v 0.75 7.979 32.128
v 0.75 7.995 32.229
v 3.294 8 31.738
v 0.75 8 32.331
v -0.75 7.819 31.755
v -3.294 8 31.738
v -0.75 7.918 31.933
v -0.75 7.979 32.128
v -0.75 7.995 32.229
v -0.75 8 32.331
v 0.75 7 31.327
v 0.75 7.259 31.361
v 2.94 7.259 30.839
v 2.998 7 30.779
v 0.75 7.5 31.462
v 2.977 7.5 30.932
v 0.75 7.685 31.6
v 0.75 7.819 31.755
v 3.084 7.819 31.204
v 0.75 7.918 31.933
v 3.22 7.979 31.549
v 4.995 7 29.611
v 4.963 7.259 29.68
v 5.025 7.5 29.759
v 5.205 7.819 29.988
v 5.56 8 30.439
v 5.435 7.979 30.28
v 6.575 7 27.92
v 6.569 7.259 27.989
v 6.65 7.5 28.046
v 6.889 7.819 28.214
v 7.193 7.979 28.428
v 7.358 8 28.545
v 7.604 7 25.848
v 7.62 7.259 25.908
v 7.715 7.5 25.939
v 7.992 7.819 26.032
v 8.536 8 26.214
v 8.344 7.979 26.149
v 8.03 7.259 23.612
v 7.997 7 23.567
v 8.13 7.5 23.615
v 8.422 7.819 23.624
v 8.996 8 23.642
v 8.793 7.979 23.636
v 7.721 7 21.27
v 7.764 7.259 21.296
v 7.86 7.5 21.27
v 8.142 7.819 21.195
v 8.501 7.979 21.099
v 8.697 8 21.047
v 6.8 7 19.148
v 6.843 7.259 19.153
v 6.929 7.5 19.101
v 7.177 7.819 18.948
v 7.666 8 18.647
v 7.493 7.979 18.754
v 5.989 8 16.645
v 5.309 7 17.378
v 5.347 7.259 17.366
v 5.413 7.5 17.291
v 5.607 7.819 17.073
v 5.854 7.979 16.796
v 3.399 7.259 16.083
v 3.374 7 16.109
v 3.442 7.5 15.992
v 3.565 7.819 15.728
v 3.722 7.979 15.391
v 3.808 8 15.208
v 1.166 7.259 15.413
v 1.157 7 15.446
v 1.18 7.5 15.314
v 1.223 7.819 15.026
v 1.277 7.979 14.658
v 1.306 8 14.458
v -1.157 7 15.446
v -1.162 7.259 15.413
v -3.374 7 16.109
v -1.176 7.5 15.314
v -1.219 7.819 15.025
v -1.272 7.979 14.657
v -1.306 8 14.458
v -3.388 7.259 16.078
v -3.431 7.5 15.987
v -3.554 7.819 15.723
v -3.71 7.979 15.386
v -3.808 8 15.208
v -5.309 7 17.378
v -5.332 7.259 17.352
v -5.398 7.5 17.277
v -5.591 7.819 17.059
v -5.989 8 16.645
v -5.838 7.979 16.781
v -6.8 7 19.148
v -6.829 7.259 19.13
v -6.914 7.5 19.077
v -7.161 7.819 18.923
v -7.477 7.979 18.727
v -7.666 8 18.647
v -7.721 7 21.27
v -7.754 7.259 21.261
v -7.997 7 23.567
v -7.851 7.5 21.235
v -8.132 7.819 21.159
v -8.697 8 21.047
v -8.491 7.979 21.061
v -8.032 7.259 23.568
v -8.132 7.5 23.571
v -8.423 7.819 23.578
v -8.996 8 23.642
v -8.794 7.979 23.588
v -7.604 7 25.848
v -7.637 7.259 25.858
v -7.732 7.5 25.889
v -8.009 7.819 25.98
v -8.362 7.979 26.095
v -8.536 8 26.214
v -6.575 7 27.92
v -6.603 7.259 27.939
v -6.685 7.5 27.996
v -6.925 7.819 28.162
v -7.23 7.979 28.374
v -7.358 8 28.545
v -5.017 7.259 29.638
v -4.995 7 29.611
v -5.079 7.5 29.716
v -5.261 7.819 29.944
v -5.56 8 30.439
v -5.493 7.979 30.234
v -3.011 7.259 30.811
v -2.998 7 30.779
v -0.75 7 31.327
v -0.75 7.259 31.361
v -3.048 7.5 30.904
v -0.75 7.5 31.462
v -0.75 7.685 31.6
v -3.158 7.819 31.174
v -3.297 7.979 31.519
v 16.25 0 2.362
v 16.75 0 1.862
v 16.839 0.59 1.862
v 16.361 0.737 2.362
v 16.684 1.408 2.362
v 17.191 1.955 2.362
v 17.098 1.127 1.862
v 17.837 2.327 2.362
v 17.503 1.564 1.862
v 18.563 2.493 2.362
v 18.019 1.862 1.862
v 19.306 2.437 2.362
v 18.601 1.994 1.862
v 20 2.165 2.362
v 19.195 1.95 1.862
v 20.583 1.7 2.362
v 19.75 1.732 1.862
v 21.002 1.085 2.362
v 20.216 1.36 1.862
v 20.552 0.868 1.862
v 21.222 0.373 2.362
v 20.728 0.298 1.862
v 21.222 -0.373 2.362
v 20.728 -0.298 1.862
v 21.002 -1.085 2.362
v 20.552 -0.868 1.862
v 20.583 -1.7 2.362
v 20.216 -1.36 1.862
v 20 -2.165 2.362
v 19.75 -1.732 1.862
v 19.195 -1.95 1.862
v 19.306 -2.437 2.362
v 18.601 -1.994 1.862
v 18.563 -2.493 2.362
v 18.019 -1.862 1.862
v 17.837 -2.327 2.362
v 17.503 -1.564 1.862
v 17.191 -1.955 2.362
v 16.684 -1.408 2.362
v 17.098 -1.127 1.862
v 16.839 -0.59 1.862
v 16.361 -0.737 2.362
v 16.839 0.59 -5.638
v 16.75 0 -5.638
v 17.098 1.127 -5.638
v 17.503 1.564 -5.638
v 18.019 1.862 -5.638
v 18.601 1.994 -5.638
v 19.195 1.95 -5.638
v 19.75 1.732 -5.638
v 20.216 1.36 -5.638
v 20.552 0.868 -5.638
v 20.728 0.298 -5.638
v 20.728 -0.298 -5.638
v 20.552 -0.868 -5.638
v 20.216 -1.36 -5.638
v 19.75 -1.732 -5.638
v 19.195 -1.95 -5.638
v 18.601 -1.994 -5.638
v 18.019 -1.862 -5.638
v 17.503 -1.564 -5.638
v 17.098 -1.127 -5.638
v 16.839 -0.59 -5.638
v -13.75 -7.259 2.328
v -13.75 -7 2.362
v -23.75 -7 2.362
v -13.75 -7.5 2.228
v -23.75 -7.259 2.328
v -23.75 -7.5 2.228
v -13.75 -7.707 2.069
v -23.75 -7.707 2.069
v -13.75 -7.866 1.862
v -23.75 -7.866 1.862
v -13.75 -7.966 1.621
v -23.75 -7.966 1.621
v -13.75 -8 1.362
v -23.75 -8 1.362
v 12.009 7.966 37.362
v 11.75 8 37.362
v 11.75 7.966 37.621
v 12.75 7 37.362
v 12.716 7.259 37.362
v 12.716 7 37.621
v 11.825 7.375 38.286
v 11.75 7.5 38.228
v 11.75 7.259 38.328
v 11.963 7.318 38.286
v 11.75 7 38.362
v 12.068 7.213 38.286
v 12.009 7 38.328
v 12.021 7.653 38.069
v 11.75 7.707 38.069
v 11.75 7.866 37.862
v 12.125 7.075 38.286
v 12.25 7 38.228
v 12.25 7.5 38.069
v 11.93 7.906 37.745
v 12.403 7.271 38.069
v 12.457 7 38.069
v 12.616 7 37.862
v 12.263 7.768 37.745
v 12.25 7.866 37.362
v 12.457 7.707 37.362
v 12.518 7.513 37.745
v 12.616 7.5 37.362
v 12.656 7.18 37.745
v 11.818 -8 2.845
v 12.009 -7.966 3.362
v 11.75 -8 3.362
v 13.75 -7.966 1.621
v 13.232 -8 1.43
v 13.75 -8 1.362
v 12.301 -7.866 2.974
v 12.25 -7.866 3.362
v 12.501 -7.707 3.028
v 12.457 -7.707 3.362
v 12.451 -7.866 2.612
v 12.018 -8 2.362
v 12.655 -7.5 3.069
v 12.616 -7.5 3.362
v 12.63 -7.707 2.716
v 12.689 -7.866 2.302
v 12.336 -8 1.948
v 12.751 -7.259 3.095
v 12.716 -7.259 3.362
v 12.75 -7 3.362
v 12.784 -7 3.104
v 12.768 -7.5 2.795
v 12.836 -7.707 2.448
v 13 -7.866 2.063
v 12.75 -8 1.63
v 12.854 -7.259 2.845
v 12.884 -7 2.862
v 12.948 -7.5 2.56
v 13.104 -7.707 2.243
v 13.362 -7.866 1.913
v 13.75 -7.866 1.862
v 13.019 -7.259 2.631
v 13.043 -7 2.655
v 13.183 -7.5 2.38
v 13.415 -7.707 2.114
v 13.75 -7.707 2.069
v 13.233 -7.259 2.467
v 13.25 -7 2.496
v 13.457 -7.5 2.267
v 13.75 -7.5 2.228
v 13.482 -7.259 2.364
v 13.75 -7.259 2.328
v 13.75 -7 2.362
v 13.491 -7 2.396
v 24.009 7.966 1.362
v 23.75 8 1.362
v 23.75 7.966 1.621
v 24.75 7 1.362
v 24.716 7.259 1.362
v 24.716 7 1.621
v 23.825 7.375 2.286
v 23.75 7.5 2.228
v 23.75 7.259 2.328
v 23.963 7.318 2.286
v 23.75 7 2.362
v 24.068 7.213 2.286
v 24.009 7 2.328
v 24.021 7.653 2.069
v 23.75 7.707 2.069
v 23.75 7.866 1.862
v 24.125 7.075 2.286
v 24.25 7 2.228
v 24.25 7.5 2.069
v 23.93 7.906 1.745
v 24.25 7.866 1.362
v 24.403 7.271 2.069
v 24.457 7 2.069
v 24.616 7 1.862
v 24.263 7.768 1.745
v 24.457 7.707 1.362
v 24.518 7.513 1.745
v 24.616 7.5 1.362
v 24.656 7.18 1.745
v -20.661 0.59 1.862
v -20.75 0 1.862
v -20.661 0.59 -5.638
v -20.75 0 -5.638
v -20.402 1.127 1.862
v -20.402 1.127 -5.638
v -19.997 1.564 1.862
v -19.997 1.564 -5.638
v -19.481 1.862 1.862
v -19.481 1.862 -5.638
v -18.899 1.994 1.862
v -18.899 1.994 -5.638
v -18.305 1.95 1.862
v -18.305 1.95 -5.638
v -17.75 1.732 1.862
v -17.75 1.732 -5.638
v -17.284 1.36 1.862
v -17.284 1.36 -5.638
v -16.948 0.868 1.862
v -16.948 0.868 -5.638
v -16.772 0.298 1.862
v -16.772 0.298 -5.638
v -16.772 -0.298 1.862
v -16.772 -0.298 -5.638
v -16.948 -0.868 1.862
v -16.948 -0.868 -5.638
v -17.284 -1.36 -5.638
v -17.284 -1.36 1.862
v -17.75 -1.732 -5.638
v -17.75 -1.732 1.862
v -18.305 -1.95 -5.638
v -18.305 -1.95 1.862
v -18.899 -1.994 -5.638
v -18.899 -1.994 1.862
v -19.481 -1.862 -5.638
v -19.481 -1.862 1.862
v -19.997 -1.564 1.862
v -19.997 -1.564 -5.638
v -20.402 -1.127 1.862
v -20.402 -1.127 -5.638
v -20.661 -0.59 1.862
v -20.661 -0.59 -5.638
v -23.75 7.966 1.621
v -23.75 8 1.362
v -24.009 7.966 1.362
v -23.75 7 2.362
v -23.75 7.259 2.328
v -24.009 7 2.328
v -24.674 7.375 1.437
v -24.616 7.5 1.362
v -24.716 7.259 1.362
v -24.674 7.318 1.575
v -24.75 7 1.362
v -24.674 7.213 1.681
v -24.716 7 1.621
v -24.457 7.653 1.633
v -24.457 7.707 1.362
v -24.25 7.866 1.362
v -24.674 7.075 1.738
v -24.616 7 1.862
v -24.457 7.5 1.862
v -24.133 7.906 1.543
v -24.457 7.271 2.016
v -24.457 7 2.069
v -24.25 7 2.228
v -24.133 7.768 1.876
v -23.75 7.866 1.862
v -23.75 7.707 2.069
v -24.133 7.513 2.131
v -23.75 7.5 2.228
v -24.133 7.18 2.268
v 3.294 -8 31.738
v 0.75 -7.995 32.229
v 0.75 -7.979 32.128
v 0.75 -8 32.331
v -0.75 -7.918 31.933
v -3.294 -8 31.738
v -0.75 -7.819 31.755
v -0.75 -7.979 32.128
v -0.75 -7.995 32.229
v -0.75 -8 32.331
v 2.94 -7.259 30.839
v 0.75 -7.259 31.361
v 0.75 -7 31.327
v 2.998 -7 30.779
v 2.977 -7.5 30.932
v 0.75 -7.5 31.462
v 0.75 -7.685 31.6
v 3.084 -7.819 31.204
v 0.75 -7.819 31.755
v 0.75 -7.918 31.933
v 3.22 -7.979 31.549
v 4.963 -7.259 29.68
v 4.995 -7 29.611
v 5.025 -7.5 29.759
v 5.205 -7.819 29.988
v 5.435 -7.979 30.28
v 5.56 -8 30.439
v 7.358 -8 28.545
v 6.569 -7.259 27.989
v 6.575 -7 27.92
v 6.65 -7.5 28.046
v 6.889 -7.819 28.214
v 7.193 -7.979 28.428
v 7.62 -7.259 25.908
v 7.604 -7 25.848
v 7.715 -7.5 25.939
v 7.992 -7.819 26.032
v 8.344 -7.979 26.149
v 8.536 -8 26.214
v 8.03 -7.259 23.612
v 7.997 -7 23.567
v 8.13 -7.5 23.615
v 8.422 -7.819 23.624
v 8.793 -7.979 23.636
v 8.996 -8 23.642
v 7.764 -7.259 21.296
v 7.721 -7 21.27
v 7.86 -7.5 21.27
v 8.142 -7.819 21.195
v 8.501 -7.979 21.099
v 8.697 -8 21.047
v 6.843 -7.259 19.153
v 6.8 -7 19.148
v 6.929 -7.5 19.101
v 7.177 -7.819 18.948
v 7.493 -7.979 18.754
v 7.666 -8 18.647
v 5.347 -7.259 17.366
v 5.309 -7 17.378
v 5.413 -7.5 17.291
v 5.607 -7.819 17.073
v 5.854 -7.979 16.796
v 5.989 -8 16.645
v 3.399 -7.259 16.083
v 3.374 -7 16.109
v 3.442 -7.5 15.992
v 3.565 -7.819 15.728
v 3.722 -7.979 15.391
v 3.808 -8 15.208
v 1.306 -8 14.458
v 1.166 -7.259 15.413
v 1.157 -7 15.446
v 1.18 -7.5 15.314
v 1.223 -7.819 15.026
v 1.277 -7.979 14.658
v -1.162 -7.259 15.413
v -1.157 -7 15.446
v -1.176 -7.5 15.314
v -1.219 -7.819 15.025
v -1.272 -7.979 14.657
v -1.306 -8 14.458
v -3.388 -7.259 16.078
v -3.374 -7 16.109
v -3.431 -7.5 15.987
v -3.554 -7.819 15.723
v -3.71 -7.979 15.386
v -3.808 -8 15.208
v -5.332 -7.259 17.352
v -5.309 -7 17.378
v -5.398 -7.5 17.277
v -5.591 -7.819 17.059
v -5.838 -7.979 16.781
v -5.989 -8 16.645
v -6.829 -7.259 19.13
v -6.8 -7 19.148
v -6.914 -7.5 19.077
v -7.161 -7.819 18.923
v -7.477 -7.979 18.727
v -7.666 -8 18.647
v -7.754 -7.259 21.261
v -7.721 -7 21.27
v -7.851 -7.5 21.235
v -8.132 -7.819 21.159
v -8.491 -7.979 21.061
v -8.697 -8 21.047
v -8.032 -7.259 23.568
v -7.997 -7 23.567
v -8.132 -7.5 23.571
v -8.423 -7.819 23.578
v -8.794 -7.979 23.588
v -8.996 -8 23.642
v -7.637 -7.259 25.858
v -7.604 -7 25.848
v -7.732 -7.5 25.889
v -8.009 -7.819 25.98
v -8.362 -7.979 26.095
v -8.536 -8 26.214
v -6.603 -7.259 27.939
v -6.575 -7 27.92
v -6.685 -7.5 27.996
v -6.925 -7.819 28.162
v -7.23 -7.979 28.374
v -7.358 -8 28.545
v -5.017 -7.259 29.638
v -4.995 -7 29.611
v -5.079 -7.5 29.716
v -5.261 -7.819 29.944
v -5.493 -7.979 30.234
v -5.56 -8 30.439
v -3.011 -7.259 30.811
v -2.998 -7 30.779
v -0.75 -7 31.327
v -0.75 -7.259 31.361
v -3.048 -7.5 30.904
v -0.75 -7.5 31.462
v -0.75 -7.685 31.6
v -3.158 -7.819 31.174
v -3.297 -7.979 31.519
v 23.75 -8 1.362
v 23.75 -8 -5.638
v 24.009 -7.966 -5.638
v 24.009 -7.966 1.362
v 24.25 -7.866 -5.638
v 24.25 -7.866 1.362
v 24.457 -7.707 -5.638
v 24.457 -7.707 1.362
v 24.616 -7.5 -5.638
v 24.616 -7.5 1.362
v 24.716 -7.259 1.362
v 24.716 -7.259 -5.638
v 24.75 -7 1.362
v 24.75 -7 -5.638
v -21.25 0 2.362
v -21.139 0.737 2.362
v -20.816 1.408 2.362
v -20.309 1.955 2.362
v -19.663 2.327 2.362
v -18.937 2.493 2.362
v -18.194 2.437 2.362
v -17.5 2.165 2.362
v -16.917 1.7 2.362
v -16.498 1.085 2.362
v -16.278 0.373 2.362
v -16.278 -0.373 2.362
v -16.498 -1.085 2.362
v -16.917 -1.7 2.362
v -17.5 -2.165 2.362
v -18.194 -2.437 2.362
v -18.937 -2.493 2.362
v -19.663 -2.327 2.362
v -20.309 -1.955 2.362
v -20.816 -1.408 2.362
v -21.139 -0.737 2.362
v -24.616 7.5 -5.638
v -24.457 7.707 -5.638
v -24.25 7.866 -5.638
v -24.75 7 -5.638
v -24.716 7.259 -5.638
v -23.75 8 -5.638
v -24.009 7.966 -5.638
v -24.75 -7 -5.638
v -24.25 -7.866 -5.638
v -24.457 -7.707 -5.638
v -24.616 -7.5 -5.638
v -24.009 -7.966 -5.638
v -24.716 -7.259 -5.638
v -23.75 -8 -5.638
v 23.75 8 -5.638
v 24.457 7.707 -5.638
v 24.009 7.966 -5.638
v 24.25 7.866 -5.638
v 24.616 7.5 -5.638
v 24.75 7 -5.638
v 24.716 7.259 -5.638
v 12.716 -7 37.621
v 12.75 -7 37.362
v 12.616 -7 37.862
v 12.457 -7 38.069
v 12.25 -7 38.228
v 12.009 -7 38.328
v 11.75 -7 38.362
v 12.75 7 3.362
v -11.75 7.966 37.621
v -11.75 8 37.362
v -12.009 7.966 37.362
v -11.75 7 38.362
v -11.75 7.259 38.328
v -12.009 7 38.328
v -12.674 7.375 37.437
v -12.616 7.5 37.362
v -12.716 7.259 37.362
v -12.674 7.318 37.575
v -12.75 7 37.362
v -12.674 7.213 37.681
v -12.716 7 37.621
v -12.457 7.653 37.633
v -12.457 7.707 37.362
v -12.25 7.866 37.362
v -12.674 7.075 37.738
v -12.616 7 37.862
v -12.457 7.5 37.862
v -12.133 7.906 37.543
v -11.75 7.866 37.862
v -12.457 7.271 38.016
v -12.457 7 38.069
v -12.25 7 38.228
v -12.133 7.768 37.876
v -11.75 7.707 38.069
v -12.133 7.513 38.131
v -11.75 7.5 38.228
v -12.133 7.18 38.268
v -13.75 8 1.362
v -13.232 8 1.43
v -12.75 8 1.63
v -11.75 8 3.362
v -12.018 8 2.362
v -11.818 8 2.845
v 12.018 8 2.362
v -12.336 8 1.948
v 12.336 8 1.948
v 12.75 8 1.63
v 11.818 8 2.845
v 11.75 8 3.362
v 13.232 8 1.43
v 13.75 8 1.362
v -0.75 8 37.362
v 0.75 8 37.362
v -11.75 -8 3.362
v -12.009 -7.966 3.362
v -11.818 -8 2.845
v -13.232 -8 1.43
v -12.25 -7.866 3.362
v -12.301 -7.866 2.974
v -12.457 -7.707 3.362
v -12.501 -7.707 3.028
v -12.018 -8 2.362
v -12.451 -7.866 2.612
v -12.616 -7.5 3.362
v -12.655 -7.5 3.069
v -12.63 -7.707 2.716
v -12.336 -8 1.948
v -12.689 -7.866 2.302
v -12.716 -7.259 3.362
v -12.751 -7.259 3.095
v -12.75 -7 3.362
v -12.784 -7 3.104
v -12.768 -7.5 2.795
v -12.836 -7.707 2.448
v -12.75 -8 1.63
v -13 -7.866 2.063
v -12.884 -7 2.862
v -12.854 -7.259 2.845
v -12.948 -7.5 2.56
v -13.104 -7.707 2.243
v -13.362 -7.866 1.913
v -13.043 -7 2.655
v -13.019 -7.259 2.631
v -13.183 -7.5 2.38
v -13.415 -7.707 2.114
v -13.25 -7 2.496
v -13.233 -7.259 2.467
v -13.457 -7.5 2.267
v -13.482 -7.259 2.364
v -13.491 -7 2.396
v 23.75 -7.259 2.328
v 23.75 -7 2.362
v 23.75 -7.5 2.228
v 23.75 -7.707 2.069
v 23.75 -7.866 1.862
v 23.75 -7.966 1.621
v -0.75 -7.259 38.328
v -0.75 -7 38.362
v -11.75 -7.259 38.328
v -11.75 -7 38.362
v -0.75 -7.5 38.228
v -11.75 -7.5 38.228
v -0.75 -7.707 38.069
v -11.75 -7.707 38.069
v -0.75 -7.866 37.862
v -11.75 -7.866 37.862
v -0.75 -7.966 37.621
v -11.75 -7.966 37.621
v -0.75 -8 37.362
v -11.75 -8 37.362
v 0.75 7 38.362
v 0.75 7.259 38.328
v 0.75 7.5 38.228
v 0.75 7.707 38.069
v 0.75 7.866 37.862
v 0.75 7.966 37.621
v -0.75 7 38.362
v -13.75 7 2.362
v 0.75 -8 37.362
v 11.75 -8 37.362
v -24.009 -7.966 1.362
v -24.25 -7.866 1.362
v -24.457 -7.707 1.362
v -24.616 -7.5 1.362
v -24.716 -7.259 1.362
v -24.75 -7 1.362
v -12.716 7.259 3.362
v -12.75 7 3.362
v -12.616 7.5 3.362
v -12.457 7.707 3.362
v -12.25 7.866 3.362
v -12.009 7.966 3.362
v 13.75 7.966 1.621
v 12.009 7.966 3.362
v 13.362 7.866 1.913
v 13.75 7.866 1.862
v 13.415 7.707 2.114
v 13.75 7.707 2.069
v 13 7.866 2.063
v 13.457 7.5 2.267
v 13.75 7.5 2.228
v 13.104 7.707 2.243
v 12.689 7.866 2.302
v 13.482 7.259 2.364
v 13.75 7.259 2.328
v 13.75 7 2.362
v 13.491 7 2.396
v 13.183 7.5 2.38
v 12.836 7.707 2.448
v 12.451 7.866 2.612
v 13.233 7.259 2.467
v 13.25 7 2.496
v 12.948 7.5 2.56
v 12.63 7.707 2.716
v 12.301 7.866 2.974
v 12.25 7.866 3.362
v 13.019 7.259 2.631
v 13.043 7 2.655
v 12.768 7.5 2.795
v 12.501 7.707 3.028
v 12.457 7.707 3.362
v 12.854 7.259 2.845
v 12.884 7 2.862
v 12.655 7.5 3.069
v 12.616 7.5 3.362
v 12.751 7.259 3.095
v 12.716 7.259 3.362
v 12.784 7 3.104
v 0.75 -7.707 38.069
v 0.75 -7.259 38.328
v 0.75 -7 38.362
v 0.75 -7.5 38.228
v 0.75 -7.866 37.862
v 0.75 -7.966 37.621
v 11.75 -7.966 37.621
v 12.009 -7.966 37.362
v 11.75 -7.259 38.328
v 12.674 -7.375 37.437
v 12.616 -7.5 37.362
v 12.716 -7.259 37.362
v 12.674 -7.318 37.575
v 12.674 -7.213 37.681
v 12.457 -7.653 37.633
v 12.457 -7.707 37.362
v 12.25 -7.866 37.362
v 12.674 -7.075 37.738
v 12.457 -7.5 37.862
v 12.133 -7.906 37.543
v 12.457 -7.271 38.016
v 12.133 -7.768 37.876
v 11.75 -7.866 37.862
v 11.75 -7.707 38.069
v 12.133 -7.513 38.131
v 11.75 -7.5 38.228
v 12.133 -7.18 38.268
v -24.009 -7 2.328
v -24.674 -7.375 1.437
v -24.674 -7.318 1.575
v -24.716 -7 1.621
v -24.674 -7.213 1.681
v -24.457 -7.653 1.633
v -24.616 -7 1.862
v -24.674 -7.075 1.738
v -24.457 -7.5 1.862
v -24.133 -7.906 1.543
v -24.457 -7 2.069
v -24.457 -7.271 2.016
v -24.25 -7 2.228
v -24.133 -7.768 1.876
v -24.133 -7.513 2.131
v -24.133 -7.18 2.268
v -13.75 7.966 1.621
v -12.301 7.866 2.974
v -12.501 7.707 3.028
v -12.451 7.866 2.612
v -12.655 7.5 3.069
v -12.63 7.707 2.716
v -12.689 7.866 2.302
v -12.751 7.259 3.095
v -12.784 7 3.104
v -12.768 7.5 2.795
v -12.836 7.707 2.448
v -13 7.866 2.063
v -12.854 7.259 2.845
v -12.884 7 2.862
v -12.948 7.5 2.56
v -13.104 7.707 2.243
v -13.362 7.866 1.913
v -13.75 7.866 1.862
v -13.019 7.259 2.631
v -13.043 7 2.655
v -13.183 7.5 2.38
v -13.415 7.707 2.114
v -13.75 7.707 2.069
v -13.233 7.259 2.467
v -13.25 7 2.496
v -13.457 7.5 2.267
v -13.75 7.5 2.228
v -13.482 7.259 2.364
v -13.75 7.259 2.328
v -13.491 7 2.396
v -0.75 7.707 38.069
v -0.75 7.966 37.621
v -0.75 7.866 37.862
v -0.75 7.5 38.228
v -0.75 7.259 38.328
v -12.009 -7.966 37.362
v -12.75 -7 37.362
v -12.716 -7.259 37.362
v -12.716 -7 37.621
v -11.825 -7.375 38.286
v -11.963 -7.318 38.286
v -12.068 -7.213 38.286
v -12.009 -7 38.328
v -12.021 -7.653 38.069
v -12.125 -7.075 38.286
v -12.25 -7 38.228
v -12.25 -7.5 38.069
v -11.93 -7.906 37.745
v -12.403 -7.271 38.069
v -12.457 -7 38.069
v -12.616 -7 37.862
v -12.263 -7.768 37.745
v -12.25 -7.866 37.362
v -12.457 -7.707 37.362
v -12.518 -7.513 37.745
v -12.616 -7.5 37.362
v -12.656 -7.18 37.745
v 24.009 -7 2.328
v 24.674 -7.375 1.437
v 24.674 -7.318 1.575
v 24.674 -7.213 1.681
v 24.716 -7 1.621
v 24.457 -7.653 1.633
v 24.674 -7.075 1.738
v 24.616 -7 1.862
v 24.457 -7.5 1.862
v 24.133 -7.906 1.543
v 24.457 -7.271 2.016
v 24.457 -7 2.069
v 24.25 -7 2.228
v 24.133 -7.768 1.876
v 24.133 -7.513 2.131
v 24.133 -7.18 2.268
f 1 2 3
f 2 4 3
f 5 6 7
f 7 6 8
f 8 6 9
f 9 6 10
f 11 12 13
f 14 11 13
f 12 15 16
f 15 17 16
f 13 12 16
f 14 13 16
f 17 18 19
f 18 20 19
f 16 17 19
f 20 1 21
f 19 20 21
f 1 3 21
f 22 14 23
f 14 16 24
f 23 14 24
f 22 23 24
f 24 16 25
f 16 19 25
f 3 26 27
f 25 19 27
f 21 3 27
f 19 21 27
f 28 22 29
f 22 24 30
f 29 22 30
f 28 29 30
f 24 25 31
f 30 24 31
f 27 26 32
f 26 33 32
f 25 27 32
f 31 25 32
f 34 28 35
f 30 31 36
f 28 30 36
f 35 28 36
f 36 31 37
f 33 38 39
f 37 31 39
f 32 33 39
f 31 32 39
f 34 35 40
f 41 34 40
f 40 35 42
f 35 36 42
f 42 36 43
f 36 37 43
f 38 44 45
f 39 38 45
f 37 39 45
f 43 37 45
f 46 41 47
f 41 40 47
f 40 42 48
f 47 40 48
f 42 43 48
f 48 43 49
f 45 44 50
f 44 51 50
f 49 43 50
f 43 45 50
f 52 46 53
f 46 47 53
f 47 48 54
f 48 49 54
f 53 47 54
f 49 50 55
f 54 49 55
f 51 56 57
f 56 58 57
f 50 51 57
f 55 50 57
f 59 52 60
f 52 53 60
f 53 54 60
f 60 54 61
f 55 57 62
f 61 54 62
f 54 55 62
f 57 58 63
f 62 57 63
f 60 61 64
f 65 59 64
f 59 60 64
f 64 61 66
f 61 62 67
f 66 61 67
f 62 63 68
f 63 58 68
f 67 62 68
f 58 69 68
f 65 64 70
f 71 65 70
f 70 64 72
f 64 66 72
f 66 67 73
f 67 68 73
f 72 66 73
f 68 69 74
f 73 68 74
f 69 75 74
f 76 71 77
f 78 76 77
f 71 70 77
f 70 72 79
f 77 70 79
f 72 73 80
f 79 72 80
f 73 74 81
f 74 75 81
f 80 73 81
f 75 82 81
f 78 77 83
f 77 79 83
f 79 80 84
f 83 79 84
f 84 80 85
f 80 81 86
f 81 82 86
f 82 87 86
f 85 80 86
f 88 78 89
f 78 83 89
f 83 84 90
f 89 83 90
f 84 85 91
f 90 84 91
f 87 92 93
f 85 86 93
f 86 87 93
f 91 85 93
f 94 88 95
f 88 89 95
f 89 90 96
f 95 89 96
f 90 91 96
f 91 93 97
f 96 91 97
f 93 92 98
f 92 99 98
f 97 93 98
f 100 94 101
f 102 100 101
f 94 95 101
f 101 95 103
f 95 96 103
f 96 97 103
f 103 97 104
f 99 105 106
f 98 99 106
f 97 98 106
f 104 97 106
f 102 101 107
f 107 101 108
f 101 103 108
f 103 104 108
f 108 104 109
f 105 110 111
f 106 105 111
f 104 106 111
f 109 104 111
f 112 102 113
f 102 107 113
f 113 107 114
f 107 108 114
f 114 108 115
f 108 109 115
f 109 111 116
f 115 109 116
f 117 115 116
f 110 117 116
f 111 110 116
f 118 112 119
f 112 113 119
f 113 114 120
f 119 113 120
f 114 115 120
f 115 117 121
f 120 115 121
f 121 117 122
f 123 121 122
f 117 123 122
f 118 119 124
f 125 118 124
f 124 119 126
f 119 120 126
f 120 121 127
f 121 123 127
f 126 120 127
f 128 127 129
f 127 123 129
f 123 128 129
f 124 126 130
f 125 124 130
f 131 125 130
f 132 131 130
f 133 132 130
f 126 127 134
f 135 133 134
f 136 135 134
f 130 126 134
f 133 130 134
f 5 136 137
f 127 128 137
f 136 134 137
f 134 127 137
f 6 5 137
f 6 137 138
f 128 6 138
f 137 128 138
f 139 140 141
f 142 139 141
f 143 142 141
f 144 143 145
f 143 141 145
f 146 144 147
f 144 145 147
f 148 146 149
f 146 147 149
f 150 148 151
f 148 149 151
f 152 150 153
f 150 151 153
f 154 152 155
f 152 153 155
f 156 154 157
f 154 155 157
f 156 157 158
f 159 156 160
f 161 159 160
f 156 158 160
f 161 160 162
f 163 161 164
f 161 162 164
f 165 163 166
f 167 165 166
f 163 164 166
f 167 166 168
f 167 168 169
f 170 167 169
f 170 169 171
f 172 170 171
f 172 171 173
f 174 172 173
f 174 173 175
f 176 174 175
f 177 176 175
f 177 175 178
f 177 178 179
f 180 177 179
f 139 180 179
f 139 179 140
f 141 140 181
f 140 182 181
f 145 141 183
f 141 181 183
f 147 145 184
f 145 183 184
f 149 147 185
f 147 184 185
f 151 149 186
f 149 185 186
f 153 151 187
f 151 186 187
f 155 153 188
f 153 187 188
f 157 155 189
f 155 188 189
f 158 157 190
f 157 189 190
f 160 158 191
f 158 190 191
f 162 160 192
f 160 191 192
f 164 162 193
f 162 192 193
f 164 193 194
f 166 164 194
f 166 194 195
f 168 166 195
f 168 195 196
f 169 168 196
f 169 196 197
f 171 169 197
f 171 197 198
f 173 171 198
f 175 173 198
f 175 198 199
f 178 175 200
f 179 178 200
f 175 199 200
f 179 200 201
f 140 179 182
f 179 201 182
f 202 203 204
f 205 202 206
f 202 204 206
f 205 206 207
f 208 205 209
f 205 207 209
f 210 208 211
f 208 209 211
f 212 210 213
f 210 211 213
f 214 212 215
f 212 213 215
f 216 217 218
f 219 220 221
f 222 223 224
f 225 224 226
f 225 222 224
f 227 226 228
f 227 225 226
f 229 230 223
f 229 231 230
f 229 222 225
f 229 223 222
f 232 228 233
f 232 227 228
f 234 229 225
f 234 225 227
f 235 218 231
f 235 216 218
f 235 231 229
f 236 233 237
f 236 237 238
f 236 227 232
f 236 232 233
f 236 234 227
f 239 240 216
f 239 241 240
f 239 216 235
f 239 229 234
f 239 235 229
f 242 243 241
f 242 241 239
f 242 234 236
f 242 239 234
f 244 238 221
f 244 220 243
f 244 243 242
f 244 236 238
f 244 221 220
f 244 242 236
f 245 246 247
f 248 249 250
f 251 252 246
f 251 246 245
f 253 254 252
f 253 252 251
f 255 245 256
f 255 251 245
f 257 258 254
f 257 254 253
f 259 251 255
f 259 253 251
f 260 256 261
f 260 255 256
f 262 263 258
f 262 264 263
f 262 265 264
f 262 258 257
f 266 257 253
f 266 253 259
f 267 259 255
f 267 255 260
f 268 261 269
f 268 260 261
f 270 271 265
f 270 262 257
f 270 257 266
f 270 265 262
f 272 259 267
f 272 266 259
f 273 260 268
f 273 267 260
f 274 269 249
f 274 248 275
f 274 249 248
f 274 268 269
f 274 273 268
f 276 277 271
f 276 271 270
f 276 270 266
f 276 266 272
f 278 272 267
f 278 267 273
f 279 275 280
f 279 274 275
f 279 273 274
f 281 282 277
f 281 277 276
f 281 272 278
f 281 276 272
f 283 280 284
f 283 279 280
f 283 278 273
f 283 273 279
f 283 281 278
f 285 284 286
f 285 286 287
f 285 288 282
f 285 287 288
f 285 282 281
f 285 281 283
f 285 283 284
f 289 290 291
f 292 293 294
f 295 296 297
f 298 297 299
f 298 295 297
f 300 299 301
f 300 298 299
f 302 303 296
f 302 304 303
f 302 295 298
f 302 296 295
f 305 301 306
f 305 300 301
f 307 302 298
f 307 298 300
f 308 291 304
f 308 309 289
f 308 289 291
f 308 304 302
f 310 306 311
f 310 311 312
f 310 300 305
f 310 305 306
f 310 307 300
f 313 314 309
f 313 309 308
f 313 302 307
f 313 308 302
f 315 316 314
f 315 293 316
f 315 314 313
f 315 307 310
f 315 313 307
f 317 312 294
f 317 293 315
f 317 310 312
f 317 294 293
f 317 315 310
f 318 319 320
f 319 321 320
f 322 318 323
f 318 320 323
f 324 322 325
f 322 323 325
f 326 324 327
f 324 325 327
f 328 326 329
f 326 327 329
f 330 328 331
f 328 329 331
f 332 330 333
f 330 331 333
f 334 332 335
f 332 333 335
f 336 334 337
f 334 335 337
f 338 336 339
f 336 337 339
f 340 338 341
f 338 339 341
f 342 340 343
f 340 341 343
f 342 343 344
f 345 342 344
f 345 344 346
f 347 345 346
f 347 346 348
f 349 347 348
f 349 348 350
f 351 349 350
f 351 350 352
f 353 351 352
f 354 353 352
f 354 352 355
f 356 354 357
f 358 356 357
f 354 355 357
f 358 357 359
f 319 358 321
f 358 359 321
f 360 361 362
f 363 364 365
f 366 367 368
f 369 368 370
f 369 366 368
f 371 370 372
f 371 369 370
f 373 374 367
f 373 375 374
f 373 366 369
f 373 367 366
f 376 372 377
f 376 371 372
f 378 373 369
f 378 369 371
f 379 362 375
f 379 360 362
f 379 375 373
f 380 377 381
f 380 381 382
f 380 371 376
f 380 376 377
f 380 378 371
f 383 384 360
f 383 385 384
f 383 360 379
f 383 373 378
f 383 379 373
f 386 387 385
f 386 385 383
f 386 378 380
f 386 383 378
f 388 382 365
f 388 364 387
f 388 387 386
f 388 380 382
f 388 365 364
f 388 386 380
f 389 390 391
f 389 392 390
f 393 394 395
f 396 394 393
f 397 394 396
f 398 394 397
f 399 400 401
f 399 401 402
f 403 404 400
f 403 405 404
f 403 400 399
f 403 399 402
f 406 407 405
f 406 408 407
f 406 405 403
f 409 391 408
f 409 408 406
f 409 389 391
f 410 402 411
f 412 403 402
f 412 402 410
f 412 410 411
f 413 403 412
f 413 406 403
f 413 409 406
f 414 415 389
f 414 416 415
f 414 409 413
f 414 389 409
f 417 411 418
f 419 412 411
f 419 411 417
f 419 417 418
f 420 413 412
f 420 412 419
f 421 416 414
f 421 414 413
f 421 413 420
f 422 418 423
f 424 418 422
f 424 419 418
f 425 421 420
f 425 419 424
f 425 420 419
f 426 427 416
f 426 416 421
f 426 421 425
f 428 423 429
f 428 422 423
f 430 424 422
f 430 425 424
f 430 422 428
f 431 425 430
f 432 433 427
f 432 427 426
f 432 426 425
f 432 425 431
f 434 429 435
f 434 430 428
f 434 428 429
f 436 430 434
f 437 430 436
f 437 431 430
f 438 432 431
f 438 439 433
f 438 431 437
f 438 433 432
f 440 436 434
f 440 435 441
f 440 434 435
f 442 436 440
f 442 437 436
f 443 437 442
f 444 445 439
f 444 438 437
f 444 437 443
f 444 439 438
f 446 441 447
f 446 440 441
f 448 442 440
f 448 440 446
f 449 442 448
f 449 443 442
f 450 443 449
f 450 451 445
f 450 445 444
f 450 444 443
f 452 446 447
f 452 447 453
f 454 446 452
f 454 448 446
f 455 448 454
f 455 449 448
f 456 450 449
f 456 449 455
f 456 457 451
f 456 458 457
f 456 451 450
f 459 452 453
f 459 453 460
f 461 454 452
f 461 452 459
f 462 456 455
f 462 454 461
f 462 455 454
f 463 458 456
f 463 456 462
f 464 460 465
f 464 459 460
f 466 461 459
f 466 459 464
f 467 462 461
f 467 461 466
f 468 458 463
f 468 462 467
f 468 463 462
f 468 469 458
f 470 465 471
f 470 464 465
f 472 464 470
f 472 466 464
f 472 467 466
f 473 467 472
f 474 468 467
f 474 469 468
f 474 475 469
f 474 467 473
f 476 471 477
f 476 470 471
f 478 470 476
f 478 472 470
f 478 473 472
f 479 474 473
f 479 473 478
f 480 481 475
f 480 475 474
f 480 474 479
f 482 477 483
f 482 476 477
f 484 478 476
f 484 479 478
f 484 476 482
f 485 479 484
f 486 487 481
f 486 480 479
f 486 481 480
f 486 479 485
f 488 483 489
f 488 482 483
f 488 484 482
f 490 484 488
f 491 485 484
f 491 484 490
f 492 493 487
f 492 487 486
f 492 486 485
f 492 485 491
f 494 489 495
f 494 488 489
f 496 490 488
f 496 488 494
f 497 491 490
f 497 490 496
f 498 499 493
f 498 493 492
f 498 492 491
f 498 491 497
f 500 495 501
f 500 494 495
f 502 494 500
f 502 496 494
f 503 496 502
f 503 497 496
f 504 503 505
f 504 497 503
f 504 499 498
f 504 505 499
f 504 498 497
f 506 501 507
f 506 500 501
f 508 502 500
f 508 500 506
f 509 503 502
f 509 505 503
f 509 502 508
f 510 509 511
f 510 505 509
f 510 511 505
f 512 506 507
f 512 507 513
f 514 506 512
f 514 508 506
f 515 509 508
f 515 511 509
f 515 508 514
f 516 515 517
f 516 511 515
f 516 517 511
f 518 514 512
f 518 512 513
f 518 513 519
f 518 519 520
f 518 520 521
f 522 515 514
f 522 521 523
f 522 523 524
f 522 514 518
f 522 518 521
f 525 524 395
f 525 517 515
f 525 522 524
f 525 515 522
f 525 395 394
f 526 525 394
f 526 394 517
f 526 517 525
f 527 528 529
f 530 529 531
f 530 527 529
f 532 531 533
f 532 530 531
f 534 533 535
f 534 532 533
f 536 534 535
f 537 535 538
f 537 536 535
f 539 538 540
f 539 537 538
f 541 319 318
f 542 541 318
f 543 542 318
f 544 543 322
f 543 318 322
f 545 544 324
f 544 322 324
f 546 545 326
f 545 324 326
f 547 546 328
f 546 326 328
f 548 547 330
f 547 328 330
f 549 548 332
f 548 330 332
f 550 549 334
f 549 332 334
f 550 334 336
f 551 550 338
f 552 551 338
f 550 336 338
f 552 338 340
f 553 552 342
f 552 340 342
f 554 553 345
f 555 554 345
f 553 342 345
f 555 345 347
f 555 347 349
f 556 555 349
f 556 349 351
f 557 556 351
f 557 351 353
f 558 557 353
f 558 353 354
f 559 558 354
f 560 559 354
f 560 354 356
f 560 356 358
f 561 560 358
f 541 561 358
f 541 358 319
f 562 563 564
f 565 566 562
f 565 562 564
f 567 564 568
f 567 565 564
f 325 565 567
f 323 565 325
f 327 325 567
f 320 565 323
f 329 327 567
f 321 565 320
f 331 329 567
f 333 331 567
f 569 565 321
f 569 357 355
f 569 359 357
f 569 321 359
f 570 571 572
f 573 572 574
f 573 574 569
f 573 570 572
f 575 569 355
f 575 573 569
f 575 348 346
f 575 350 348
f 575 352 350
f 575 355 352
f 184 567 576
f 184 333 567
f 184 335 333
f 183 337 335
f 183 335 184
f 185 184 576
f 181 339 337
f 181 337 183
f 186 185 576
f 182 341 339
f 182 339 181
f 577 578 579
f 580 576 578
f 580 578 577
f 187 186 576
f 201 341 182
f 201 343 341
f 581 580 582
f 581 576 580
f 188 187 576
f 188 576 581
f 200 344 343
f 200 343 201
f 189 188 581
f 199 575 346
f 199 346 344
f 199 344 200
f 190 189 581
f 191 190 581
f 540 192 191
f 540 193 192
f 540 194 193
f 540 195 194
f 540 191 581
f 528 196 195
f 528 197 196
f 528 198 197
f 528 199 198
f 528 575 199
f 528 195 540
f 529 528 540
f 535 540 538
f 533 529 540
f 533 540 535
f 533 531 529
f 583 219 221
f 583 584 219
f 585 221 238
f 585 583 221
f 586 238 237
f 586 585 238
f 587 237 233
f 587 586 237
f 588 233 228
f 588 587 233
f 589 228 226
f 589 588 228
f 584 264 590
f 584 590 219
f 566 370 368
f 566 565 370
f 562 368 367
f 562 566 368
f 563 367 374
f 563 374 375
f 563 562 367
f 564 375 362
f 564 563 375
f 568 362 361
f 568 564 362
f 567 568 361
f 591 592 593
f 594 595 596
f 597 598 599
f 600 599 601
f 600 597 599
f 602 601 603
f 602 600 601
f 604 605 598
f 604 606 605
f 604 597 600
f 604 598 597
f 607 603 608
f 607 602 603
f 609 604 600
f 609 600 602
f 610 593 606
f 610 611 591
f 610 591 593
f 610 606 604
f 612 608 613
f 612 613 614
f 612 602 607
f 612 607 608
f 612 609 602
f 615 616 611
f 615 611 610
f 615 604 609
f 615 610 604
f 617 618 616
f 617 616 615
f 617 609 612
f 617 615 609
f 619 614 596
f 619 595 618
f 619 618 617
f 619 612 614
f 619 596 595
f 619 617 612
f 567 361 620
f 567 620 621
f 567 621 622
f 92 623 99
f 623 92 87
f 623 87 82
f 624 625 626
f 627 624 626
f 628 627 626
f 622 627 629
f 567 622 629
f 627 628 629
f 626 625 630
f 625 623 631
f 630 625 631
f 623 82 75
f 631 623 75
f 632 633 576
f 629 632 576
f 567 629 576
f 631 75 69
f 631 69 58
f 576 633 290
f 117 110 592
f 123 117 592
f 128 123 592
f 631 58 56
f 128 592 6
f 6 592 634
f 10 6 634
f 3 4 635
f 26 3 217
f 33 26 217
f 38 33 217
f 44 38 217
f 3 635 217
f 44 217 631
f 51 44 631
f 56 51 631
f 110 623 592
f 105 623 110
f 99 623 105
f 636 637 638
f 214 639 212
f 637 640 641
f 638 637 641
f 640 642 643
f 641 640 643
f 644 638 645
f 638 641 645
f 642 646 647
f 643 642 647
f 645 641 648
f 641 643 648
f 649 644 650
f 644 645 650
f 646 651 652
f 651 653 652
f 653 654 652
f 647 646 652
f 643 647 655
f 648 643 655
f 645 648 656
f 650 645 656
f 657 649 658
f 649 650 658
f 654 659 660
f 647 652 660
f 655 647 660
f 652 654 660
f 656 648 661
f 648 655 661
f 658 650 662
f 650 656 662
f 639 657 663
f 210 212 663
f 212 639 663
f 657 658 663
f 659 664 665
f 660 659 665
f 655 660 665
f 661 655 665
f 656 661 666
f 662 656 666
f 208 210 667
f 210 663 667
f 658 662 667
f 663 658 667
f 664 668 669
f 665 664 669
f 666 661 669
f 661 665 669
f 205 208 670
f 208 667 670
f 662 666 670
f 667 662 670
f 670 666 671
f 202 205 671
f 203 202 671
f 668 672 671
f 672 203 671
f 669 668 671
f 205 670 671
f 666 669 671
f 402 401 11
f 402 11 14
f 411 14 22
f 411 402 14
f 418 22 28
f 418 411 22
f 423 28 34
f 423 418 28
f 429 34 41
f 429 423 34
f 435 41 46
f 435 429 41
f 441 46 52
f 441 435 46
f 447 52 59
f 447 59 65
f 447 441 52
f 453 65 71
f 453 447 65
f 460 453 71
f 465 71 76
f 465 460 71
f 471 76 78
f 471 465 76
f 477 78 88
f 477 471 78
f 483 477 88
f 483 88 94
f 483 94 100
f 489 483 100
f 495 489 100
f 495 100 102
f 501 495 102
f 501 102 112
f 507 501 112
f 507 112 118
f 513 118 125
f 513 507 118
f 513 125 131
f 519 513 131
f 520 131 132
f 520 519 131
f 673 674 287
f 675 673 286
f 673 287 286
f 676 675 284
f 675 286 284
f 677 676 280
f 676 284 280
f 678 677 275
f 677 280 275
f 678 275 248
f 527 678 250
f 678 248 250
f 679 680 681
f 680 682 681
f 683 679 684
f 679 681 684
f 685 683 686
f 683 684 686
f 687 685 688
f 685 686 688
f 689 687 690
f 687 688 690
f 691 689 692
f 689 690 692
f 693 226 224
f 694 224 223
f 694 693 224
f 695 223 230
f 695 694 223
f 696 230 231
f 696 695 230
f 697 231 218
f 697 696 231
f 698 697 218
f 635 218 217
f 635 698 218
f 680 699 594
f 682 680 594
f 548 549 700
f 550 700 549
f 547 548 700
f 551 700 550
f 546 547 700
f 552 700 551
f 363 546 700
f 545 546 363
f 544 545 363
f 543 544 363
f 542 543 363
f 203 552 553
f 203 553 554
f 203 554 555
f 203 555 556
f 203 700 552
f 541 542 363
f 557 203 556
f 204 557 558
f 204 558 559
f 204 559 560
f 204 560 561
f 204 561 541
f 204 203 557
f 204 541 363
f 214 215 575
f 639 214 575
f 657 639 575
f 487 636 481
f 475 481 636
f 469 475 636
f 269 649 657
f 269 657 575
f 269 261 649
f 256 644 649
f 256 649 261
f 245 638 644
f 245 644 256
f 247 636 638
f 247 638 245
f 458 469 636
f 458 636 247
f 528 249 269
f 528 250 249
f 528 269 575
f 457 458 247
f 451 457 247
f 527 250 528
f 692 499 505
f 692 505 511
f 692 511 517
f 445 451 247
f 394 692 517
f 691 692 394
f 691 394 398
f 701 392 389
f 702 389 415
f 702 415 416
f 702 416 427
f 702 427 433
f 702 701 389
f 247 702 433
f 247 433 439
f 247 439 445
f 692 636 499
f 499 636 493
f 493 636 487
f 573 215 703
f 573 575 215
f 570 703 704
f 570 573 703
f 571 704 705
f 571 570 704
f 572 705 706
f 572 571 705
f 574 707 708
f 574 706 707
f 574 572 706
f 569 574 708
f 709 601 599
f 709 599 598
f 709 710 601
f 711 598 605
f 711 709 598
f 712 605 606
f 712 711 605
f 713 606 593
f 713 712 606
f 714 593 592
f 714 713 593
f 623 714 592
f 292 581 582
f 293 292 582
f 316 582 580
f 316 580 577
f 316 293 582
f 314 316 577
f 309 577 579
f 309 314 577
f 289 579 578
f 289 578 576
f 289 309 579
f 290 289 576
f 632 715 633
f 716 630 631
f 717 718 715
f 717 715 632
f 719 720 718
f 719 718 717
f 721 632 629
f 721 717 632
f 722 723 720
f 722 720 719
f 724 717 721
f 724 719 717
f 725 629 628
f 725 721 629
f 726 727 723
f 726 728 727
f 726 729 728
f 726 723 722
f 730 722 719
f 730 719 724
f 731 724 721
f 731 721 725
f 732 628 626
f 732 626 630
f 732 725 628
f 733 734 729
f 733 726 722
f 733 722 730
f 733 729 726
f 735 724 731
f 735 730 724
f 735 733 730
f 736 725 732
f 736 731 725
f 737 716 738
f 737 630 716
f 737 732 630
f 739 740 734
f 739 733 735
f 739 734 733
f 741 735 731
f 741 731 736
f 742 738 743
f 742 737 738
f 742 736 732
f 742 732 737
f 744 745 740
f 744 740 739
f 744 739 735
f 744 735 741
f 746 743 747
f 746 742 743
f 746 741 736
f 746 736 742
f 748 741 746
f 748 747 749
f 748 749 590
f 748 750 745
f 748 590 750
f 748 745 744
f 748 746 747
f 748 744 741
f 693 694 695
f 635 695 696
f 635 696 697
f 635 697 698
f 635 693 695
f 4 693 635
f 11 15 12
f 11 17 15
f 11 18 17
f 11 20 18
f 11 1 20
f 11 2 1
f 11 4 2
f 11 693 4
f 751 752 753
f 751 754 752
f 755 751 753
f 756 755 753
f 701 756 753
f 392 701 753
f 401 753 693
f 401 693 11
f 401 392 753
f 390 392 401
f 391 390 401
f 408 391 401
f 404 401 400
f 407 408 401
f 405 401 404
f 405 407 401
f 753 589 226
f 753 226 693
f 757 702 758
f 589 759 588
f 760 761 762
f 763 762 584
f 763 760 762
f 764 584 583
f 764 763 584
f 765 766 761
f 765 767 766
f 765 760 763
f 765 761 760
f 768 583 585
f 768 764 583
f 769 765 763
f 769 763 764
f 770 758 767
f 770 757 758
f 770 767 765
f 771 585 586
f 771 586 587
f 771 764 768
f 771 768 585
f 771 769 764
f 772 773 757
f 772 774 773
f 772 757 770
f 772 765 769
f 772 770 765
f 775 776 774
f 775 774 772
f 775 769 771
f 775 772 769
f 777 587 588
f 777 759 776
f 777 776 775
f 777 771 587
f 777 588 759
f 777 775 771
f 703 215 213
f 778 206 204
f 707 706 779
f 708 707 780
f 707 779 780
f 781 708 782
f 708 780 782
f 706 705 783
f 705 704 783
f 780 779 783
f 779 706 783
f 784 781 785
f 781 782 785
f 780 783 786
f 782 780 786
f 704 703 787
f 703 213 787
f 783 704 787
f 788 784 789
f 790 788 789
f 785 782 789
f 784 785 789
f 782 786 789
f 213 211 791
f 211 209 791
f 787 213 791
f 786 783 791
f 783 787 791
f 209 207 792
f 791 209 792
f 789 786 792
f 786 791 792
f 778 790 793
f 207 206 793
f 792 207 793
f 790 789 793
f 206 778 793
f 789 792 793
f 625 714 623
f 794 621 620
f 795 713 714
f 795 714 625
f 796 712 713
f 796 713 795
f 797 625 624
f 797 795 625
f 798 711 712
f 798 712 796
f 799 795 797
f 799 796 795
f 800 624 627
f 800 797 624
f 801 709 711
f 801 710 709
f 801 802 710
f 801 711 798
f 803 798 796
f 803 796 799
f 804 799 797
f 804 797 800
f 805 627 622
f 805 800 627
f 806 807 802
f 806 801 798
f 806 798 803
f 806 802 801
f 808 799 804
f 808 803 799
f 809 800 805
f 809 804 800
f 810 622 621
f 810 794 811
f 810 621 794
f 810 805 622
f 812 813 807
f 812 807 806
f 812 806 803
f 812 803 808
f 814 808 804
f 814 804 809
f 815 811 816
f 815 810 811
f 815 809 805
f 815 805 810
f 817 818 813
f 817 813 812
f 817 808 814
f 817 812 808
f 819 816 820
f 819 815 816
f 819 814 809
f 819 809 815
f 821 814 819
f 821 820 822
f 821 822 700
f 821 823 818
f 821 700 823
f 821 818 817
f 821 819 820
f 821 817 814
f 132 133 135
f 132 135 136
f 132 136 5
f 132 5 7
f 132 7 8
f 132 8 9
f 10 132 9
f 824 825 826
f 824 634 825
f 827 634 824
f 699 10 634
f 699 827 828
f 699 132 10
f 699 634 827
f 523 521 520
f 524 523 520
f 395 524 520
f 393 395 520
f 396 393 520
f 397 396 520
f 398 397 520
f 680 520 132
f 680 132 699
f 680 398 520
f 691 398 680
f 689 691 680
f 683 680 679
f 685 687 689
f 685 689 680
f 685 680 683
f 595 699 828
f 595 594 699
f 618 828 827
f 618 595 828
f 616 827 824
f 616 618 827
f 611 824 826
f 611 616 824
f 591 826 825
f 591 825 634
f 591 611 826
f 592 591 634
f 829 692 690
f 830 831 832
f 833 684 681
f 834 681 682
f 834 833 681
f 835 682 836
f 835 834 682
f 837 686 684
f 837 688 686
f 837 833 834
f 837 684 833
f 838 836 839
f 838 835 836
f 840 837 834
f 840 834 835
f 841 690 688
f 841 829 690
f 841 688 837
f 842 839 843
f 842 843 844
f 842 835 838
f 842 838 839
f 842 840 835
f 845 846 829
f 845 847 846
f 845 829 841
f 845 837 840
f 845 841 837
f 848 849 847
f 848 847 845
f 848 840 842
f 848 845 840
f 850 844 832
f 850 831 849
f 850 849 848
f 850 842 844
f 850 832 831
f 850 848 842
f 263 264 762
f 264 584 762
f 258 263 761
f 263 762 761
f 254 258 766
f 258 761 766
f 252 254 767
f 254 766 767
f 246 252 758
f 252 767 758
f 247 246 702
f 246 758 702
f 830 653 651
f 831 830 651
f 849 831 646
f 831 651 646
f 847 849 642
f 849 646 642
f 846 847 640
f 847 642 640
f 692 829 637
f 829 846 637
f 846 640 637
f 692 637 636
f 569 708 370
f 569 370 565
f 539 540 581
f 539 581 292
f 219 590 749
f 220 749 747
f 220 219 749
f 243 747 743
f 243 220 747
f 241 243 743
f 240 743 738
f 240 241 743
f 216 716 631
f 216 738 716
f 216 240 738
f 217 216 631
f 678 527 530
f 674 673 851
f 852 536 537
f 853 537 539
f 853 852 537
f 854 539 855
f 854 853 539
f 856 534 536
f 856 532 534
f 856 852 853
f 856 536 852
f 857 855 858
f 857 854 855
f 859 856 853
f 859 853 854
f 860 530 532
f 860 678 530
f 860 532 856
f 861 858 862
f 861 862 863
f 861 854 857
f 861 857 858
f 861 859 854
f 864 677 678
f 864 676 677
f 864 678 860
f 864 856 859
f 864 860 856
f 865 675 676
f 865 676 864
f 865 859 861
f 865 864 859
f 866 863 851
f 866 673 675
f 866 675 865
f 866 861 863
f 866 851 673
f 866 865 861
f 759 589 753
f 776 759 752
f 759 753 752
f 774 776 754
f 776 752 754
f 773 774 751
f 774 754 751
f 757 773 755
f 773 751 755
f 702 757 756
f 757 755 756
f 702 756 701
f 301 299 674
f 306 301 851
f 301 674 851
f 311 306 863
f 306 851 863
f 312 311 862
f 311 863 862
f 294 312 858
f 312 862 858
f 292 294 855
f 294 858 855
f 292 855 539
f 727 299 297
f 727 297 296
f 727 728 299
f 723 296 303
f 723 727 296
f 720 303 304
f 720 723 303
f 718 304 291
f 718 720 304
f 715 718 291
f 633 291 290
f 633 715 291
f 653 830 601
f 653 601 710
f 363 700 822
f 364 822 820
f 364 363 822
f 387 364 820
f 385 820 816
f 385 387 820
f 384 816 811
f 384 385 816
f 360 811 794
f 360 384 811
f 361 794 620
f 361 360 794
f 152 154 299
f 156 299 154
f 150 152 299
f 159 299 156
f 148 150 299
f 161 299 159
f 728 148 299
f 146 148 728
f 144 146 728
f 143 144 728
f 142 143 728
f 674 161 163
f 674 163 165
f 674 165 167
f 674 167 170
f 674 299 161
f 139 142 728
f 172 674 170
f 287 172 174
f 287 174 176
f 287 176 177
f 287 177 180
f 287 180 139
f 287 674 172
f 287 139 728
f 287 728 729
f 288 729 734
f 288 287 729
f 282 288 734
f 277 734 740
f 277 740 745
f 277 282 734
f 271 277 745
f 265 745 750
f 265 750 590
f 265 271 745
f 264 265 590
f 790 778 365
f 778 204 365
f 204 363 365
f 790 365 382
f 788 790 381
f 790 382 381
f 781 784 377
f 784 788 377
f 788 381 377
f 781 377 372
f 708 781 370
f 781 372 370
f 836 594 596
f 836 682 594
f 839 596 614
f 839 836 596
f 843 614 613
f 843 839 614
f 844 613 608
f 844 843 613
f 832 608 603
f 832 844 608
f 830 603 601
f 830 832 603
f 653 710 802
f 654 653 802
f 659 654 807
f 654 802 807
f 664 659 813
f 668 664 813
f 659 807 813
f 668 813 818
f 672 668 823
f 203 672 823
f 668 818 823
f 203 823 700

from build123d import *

# Parameters (mm, degrees)
F1_DEPTH       = 8
F3_D           = 4
F3_CSINK_D     = 5
F3_CSINK_ANGLE = 90
F4_R           = 1


with BuildPart() as f1:
    # F0 (on Front) → F1 (new body, symmetric)
    with BuildSketch(Plane.XZ):
        with BuildLine():
            Line((-24.75, -5.63766), (24.75, -5.63766))
            Line((24.75, -5.63766), (24.75, 2.36234))
            Line((24.75, 2.36234), (12.75, 2.36234))
            Line((12.75, 2.36234), (12.75, 38.36234))
            Line((12.75, 38.36234), (0.75, 38.36234))
            Line((0.75, 38.36234), (0.75, 31.327106))
            ThreePointArc((0.75, 31.327106), (0, 15.36234), (-0.75, 31.327106))
            Line((-0.75, 31.327106), (-0.75, 38.36234))
            Line((-0.75, 38.36234), (-12.75, 38.36234))
            Line((-12.75, 38.36234), (-12.75, 2.36234))
            Line((-12.75, 2.36234), (-24.75, 2.36234))
            Line((-24.75, 2.36234), (-24.75, -5.63766))
        make_face()
    extrude(amount=F1_DEPTH, both=True)

    # F3 (through all)
    with Locations(Plane.XY.offset(2.36234)):
        with Locations((18.75, 0), (-18.75, 0)):
            CounterSinkHole(F3_D / 2, F3_CSINK_D / 2, counter_sink_angle=F3_CSINK_ANGLE)

    # F4
    f4_edges = [f1.edges().sort_by_distance(p)[0] for p in [
        (-12.75, -8, 20.36234),
        (-18.75, -8, 2.36234),
        (-24.75, -8, -1.63766),
        (-6.75, -8, 38.36234),
        (6.75, -8, 38.36234),
        (12.75, -8, 20.36234),
        (18.75, -8, 2.36234),
        (24.75, -8, -1.63766),
        (0, -8, 15.36234),
        (24.75, 8, -1.63766),
        (18.75, 8, 2.36234),
        (12.75, 8, 20.36234),
        (6.75, 8, 38.36234),
        (-6.75, 8, 38.36234),
        (-12.75, 8, 20.36234),
        (-18.75, 8, 2.36234),
        (-24.75, 8, -1.63766),
        (0, 8, 15.36234),
        (12.75, 0, 2.36234),
        (24.75, 0, 2.36234),
        (12.75, 0, 38.36234),
        (-24.75, 0, 2.36234),
        (-12.75, 0, 2.36234),
        (-12.75, 0, 38.36234),
    ]]
    fillet(f4_edges, radius=F4_R)


solid = f1.part
